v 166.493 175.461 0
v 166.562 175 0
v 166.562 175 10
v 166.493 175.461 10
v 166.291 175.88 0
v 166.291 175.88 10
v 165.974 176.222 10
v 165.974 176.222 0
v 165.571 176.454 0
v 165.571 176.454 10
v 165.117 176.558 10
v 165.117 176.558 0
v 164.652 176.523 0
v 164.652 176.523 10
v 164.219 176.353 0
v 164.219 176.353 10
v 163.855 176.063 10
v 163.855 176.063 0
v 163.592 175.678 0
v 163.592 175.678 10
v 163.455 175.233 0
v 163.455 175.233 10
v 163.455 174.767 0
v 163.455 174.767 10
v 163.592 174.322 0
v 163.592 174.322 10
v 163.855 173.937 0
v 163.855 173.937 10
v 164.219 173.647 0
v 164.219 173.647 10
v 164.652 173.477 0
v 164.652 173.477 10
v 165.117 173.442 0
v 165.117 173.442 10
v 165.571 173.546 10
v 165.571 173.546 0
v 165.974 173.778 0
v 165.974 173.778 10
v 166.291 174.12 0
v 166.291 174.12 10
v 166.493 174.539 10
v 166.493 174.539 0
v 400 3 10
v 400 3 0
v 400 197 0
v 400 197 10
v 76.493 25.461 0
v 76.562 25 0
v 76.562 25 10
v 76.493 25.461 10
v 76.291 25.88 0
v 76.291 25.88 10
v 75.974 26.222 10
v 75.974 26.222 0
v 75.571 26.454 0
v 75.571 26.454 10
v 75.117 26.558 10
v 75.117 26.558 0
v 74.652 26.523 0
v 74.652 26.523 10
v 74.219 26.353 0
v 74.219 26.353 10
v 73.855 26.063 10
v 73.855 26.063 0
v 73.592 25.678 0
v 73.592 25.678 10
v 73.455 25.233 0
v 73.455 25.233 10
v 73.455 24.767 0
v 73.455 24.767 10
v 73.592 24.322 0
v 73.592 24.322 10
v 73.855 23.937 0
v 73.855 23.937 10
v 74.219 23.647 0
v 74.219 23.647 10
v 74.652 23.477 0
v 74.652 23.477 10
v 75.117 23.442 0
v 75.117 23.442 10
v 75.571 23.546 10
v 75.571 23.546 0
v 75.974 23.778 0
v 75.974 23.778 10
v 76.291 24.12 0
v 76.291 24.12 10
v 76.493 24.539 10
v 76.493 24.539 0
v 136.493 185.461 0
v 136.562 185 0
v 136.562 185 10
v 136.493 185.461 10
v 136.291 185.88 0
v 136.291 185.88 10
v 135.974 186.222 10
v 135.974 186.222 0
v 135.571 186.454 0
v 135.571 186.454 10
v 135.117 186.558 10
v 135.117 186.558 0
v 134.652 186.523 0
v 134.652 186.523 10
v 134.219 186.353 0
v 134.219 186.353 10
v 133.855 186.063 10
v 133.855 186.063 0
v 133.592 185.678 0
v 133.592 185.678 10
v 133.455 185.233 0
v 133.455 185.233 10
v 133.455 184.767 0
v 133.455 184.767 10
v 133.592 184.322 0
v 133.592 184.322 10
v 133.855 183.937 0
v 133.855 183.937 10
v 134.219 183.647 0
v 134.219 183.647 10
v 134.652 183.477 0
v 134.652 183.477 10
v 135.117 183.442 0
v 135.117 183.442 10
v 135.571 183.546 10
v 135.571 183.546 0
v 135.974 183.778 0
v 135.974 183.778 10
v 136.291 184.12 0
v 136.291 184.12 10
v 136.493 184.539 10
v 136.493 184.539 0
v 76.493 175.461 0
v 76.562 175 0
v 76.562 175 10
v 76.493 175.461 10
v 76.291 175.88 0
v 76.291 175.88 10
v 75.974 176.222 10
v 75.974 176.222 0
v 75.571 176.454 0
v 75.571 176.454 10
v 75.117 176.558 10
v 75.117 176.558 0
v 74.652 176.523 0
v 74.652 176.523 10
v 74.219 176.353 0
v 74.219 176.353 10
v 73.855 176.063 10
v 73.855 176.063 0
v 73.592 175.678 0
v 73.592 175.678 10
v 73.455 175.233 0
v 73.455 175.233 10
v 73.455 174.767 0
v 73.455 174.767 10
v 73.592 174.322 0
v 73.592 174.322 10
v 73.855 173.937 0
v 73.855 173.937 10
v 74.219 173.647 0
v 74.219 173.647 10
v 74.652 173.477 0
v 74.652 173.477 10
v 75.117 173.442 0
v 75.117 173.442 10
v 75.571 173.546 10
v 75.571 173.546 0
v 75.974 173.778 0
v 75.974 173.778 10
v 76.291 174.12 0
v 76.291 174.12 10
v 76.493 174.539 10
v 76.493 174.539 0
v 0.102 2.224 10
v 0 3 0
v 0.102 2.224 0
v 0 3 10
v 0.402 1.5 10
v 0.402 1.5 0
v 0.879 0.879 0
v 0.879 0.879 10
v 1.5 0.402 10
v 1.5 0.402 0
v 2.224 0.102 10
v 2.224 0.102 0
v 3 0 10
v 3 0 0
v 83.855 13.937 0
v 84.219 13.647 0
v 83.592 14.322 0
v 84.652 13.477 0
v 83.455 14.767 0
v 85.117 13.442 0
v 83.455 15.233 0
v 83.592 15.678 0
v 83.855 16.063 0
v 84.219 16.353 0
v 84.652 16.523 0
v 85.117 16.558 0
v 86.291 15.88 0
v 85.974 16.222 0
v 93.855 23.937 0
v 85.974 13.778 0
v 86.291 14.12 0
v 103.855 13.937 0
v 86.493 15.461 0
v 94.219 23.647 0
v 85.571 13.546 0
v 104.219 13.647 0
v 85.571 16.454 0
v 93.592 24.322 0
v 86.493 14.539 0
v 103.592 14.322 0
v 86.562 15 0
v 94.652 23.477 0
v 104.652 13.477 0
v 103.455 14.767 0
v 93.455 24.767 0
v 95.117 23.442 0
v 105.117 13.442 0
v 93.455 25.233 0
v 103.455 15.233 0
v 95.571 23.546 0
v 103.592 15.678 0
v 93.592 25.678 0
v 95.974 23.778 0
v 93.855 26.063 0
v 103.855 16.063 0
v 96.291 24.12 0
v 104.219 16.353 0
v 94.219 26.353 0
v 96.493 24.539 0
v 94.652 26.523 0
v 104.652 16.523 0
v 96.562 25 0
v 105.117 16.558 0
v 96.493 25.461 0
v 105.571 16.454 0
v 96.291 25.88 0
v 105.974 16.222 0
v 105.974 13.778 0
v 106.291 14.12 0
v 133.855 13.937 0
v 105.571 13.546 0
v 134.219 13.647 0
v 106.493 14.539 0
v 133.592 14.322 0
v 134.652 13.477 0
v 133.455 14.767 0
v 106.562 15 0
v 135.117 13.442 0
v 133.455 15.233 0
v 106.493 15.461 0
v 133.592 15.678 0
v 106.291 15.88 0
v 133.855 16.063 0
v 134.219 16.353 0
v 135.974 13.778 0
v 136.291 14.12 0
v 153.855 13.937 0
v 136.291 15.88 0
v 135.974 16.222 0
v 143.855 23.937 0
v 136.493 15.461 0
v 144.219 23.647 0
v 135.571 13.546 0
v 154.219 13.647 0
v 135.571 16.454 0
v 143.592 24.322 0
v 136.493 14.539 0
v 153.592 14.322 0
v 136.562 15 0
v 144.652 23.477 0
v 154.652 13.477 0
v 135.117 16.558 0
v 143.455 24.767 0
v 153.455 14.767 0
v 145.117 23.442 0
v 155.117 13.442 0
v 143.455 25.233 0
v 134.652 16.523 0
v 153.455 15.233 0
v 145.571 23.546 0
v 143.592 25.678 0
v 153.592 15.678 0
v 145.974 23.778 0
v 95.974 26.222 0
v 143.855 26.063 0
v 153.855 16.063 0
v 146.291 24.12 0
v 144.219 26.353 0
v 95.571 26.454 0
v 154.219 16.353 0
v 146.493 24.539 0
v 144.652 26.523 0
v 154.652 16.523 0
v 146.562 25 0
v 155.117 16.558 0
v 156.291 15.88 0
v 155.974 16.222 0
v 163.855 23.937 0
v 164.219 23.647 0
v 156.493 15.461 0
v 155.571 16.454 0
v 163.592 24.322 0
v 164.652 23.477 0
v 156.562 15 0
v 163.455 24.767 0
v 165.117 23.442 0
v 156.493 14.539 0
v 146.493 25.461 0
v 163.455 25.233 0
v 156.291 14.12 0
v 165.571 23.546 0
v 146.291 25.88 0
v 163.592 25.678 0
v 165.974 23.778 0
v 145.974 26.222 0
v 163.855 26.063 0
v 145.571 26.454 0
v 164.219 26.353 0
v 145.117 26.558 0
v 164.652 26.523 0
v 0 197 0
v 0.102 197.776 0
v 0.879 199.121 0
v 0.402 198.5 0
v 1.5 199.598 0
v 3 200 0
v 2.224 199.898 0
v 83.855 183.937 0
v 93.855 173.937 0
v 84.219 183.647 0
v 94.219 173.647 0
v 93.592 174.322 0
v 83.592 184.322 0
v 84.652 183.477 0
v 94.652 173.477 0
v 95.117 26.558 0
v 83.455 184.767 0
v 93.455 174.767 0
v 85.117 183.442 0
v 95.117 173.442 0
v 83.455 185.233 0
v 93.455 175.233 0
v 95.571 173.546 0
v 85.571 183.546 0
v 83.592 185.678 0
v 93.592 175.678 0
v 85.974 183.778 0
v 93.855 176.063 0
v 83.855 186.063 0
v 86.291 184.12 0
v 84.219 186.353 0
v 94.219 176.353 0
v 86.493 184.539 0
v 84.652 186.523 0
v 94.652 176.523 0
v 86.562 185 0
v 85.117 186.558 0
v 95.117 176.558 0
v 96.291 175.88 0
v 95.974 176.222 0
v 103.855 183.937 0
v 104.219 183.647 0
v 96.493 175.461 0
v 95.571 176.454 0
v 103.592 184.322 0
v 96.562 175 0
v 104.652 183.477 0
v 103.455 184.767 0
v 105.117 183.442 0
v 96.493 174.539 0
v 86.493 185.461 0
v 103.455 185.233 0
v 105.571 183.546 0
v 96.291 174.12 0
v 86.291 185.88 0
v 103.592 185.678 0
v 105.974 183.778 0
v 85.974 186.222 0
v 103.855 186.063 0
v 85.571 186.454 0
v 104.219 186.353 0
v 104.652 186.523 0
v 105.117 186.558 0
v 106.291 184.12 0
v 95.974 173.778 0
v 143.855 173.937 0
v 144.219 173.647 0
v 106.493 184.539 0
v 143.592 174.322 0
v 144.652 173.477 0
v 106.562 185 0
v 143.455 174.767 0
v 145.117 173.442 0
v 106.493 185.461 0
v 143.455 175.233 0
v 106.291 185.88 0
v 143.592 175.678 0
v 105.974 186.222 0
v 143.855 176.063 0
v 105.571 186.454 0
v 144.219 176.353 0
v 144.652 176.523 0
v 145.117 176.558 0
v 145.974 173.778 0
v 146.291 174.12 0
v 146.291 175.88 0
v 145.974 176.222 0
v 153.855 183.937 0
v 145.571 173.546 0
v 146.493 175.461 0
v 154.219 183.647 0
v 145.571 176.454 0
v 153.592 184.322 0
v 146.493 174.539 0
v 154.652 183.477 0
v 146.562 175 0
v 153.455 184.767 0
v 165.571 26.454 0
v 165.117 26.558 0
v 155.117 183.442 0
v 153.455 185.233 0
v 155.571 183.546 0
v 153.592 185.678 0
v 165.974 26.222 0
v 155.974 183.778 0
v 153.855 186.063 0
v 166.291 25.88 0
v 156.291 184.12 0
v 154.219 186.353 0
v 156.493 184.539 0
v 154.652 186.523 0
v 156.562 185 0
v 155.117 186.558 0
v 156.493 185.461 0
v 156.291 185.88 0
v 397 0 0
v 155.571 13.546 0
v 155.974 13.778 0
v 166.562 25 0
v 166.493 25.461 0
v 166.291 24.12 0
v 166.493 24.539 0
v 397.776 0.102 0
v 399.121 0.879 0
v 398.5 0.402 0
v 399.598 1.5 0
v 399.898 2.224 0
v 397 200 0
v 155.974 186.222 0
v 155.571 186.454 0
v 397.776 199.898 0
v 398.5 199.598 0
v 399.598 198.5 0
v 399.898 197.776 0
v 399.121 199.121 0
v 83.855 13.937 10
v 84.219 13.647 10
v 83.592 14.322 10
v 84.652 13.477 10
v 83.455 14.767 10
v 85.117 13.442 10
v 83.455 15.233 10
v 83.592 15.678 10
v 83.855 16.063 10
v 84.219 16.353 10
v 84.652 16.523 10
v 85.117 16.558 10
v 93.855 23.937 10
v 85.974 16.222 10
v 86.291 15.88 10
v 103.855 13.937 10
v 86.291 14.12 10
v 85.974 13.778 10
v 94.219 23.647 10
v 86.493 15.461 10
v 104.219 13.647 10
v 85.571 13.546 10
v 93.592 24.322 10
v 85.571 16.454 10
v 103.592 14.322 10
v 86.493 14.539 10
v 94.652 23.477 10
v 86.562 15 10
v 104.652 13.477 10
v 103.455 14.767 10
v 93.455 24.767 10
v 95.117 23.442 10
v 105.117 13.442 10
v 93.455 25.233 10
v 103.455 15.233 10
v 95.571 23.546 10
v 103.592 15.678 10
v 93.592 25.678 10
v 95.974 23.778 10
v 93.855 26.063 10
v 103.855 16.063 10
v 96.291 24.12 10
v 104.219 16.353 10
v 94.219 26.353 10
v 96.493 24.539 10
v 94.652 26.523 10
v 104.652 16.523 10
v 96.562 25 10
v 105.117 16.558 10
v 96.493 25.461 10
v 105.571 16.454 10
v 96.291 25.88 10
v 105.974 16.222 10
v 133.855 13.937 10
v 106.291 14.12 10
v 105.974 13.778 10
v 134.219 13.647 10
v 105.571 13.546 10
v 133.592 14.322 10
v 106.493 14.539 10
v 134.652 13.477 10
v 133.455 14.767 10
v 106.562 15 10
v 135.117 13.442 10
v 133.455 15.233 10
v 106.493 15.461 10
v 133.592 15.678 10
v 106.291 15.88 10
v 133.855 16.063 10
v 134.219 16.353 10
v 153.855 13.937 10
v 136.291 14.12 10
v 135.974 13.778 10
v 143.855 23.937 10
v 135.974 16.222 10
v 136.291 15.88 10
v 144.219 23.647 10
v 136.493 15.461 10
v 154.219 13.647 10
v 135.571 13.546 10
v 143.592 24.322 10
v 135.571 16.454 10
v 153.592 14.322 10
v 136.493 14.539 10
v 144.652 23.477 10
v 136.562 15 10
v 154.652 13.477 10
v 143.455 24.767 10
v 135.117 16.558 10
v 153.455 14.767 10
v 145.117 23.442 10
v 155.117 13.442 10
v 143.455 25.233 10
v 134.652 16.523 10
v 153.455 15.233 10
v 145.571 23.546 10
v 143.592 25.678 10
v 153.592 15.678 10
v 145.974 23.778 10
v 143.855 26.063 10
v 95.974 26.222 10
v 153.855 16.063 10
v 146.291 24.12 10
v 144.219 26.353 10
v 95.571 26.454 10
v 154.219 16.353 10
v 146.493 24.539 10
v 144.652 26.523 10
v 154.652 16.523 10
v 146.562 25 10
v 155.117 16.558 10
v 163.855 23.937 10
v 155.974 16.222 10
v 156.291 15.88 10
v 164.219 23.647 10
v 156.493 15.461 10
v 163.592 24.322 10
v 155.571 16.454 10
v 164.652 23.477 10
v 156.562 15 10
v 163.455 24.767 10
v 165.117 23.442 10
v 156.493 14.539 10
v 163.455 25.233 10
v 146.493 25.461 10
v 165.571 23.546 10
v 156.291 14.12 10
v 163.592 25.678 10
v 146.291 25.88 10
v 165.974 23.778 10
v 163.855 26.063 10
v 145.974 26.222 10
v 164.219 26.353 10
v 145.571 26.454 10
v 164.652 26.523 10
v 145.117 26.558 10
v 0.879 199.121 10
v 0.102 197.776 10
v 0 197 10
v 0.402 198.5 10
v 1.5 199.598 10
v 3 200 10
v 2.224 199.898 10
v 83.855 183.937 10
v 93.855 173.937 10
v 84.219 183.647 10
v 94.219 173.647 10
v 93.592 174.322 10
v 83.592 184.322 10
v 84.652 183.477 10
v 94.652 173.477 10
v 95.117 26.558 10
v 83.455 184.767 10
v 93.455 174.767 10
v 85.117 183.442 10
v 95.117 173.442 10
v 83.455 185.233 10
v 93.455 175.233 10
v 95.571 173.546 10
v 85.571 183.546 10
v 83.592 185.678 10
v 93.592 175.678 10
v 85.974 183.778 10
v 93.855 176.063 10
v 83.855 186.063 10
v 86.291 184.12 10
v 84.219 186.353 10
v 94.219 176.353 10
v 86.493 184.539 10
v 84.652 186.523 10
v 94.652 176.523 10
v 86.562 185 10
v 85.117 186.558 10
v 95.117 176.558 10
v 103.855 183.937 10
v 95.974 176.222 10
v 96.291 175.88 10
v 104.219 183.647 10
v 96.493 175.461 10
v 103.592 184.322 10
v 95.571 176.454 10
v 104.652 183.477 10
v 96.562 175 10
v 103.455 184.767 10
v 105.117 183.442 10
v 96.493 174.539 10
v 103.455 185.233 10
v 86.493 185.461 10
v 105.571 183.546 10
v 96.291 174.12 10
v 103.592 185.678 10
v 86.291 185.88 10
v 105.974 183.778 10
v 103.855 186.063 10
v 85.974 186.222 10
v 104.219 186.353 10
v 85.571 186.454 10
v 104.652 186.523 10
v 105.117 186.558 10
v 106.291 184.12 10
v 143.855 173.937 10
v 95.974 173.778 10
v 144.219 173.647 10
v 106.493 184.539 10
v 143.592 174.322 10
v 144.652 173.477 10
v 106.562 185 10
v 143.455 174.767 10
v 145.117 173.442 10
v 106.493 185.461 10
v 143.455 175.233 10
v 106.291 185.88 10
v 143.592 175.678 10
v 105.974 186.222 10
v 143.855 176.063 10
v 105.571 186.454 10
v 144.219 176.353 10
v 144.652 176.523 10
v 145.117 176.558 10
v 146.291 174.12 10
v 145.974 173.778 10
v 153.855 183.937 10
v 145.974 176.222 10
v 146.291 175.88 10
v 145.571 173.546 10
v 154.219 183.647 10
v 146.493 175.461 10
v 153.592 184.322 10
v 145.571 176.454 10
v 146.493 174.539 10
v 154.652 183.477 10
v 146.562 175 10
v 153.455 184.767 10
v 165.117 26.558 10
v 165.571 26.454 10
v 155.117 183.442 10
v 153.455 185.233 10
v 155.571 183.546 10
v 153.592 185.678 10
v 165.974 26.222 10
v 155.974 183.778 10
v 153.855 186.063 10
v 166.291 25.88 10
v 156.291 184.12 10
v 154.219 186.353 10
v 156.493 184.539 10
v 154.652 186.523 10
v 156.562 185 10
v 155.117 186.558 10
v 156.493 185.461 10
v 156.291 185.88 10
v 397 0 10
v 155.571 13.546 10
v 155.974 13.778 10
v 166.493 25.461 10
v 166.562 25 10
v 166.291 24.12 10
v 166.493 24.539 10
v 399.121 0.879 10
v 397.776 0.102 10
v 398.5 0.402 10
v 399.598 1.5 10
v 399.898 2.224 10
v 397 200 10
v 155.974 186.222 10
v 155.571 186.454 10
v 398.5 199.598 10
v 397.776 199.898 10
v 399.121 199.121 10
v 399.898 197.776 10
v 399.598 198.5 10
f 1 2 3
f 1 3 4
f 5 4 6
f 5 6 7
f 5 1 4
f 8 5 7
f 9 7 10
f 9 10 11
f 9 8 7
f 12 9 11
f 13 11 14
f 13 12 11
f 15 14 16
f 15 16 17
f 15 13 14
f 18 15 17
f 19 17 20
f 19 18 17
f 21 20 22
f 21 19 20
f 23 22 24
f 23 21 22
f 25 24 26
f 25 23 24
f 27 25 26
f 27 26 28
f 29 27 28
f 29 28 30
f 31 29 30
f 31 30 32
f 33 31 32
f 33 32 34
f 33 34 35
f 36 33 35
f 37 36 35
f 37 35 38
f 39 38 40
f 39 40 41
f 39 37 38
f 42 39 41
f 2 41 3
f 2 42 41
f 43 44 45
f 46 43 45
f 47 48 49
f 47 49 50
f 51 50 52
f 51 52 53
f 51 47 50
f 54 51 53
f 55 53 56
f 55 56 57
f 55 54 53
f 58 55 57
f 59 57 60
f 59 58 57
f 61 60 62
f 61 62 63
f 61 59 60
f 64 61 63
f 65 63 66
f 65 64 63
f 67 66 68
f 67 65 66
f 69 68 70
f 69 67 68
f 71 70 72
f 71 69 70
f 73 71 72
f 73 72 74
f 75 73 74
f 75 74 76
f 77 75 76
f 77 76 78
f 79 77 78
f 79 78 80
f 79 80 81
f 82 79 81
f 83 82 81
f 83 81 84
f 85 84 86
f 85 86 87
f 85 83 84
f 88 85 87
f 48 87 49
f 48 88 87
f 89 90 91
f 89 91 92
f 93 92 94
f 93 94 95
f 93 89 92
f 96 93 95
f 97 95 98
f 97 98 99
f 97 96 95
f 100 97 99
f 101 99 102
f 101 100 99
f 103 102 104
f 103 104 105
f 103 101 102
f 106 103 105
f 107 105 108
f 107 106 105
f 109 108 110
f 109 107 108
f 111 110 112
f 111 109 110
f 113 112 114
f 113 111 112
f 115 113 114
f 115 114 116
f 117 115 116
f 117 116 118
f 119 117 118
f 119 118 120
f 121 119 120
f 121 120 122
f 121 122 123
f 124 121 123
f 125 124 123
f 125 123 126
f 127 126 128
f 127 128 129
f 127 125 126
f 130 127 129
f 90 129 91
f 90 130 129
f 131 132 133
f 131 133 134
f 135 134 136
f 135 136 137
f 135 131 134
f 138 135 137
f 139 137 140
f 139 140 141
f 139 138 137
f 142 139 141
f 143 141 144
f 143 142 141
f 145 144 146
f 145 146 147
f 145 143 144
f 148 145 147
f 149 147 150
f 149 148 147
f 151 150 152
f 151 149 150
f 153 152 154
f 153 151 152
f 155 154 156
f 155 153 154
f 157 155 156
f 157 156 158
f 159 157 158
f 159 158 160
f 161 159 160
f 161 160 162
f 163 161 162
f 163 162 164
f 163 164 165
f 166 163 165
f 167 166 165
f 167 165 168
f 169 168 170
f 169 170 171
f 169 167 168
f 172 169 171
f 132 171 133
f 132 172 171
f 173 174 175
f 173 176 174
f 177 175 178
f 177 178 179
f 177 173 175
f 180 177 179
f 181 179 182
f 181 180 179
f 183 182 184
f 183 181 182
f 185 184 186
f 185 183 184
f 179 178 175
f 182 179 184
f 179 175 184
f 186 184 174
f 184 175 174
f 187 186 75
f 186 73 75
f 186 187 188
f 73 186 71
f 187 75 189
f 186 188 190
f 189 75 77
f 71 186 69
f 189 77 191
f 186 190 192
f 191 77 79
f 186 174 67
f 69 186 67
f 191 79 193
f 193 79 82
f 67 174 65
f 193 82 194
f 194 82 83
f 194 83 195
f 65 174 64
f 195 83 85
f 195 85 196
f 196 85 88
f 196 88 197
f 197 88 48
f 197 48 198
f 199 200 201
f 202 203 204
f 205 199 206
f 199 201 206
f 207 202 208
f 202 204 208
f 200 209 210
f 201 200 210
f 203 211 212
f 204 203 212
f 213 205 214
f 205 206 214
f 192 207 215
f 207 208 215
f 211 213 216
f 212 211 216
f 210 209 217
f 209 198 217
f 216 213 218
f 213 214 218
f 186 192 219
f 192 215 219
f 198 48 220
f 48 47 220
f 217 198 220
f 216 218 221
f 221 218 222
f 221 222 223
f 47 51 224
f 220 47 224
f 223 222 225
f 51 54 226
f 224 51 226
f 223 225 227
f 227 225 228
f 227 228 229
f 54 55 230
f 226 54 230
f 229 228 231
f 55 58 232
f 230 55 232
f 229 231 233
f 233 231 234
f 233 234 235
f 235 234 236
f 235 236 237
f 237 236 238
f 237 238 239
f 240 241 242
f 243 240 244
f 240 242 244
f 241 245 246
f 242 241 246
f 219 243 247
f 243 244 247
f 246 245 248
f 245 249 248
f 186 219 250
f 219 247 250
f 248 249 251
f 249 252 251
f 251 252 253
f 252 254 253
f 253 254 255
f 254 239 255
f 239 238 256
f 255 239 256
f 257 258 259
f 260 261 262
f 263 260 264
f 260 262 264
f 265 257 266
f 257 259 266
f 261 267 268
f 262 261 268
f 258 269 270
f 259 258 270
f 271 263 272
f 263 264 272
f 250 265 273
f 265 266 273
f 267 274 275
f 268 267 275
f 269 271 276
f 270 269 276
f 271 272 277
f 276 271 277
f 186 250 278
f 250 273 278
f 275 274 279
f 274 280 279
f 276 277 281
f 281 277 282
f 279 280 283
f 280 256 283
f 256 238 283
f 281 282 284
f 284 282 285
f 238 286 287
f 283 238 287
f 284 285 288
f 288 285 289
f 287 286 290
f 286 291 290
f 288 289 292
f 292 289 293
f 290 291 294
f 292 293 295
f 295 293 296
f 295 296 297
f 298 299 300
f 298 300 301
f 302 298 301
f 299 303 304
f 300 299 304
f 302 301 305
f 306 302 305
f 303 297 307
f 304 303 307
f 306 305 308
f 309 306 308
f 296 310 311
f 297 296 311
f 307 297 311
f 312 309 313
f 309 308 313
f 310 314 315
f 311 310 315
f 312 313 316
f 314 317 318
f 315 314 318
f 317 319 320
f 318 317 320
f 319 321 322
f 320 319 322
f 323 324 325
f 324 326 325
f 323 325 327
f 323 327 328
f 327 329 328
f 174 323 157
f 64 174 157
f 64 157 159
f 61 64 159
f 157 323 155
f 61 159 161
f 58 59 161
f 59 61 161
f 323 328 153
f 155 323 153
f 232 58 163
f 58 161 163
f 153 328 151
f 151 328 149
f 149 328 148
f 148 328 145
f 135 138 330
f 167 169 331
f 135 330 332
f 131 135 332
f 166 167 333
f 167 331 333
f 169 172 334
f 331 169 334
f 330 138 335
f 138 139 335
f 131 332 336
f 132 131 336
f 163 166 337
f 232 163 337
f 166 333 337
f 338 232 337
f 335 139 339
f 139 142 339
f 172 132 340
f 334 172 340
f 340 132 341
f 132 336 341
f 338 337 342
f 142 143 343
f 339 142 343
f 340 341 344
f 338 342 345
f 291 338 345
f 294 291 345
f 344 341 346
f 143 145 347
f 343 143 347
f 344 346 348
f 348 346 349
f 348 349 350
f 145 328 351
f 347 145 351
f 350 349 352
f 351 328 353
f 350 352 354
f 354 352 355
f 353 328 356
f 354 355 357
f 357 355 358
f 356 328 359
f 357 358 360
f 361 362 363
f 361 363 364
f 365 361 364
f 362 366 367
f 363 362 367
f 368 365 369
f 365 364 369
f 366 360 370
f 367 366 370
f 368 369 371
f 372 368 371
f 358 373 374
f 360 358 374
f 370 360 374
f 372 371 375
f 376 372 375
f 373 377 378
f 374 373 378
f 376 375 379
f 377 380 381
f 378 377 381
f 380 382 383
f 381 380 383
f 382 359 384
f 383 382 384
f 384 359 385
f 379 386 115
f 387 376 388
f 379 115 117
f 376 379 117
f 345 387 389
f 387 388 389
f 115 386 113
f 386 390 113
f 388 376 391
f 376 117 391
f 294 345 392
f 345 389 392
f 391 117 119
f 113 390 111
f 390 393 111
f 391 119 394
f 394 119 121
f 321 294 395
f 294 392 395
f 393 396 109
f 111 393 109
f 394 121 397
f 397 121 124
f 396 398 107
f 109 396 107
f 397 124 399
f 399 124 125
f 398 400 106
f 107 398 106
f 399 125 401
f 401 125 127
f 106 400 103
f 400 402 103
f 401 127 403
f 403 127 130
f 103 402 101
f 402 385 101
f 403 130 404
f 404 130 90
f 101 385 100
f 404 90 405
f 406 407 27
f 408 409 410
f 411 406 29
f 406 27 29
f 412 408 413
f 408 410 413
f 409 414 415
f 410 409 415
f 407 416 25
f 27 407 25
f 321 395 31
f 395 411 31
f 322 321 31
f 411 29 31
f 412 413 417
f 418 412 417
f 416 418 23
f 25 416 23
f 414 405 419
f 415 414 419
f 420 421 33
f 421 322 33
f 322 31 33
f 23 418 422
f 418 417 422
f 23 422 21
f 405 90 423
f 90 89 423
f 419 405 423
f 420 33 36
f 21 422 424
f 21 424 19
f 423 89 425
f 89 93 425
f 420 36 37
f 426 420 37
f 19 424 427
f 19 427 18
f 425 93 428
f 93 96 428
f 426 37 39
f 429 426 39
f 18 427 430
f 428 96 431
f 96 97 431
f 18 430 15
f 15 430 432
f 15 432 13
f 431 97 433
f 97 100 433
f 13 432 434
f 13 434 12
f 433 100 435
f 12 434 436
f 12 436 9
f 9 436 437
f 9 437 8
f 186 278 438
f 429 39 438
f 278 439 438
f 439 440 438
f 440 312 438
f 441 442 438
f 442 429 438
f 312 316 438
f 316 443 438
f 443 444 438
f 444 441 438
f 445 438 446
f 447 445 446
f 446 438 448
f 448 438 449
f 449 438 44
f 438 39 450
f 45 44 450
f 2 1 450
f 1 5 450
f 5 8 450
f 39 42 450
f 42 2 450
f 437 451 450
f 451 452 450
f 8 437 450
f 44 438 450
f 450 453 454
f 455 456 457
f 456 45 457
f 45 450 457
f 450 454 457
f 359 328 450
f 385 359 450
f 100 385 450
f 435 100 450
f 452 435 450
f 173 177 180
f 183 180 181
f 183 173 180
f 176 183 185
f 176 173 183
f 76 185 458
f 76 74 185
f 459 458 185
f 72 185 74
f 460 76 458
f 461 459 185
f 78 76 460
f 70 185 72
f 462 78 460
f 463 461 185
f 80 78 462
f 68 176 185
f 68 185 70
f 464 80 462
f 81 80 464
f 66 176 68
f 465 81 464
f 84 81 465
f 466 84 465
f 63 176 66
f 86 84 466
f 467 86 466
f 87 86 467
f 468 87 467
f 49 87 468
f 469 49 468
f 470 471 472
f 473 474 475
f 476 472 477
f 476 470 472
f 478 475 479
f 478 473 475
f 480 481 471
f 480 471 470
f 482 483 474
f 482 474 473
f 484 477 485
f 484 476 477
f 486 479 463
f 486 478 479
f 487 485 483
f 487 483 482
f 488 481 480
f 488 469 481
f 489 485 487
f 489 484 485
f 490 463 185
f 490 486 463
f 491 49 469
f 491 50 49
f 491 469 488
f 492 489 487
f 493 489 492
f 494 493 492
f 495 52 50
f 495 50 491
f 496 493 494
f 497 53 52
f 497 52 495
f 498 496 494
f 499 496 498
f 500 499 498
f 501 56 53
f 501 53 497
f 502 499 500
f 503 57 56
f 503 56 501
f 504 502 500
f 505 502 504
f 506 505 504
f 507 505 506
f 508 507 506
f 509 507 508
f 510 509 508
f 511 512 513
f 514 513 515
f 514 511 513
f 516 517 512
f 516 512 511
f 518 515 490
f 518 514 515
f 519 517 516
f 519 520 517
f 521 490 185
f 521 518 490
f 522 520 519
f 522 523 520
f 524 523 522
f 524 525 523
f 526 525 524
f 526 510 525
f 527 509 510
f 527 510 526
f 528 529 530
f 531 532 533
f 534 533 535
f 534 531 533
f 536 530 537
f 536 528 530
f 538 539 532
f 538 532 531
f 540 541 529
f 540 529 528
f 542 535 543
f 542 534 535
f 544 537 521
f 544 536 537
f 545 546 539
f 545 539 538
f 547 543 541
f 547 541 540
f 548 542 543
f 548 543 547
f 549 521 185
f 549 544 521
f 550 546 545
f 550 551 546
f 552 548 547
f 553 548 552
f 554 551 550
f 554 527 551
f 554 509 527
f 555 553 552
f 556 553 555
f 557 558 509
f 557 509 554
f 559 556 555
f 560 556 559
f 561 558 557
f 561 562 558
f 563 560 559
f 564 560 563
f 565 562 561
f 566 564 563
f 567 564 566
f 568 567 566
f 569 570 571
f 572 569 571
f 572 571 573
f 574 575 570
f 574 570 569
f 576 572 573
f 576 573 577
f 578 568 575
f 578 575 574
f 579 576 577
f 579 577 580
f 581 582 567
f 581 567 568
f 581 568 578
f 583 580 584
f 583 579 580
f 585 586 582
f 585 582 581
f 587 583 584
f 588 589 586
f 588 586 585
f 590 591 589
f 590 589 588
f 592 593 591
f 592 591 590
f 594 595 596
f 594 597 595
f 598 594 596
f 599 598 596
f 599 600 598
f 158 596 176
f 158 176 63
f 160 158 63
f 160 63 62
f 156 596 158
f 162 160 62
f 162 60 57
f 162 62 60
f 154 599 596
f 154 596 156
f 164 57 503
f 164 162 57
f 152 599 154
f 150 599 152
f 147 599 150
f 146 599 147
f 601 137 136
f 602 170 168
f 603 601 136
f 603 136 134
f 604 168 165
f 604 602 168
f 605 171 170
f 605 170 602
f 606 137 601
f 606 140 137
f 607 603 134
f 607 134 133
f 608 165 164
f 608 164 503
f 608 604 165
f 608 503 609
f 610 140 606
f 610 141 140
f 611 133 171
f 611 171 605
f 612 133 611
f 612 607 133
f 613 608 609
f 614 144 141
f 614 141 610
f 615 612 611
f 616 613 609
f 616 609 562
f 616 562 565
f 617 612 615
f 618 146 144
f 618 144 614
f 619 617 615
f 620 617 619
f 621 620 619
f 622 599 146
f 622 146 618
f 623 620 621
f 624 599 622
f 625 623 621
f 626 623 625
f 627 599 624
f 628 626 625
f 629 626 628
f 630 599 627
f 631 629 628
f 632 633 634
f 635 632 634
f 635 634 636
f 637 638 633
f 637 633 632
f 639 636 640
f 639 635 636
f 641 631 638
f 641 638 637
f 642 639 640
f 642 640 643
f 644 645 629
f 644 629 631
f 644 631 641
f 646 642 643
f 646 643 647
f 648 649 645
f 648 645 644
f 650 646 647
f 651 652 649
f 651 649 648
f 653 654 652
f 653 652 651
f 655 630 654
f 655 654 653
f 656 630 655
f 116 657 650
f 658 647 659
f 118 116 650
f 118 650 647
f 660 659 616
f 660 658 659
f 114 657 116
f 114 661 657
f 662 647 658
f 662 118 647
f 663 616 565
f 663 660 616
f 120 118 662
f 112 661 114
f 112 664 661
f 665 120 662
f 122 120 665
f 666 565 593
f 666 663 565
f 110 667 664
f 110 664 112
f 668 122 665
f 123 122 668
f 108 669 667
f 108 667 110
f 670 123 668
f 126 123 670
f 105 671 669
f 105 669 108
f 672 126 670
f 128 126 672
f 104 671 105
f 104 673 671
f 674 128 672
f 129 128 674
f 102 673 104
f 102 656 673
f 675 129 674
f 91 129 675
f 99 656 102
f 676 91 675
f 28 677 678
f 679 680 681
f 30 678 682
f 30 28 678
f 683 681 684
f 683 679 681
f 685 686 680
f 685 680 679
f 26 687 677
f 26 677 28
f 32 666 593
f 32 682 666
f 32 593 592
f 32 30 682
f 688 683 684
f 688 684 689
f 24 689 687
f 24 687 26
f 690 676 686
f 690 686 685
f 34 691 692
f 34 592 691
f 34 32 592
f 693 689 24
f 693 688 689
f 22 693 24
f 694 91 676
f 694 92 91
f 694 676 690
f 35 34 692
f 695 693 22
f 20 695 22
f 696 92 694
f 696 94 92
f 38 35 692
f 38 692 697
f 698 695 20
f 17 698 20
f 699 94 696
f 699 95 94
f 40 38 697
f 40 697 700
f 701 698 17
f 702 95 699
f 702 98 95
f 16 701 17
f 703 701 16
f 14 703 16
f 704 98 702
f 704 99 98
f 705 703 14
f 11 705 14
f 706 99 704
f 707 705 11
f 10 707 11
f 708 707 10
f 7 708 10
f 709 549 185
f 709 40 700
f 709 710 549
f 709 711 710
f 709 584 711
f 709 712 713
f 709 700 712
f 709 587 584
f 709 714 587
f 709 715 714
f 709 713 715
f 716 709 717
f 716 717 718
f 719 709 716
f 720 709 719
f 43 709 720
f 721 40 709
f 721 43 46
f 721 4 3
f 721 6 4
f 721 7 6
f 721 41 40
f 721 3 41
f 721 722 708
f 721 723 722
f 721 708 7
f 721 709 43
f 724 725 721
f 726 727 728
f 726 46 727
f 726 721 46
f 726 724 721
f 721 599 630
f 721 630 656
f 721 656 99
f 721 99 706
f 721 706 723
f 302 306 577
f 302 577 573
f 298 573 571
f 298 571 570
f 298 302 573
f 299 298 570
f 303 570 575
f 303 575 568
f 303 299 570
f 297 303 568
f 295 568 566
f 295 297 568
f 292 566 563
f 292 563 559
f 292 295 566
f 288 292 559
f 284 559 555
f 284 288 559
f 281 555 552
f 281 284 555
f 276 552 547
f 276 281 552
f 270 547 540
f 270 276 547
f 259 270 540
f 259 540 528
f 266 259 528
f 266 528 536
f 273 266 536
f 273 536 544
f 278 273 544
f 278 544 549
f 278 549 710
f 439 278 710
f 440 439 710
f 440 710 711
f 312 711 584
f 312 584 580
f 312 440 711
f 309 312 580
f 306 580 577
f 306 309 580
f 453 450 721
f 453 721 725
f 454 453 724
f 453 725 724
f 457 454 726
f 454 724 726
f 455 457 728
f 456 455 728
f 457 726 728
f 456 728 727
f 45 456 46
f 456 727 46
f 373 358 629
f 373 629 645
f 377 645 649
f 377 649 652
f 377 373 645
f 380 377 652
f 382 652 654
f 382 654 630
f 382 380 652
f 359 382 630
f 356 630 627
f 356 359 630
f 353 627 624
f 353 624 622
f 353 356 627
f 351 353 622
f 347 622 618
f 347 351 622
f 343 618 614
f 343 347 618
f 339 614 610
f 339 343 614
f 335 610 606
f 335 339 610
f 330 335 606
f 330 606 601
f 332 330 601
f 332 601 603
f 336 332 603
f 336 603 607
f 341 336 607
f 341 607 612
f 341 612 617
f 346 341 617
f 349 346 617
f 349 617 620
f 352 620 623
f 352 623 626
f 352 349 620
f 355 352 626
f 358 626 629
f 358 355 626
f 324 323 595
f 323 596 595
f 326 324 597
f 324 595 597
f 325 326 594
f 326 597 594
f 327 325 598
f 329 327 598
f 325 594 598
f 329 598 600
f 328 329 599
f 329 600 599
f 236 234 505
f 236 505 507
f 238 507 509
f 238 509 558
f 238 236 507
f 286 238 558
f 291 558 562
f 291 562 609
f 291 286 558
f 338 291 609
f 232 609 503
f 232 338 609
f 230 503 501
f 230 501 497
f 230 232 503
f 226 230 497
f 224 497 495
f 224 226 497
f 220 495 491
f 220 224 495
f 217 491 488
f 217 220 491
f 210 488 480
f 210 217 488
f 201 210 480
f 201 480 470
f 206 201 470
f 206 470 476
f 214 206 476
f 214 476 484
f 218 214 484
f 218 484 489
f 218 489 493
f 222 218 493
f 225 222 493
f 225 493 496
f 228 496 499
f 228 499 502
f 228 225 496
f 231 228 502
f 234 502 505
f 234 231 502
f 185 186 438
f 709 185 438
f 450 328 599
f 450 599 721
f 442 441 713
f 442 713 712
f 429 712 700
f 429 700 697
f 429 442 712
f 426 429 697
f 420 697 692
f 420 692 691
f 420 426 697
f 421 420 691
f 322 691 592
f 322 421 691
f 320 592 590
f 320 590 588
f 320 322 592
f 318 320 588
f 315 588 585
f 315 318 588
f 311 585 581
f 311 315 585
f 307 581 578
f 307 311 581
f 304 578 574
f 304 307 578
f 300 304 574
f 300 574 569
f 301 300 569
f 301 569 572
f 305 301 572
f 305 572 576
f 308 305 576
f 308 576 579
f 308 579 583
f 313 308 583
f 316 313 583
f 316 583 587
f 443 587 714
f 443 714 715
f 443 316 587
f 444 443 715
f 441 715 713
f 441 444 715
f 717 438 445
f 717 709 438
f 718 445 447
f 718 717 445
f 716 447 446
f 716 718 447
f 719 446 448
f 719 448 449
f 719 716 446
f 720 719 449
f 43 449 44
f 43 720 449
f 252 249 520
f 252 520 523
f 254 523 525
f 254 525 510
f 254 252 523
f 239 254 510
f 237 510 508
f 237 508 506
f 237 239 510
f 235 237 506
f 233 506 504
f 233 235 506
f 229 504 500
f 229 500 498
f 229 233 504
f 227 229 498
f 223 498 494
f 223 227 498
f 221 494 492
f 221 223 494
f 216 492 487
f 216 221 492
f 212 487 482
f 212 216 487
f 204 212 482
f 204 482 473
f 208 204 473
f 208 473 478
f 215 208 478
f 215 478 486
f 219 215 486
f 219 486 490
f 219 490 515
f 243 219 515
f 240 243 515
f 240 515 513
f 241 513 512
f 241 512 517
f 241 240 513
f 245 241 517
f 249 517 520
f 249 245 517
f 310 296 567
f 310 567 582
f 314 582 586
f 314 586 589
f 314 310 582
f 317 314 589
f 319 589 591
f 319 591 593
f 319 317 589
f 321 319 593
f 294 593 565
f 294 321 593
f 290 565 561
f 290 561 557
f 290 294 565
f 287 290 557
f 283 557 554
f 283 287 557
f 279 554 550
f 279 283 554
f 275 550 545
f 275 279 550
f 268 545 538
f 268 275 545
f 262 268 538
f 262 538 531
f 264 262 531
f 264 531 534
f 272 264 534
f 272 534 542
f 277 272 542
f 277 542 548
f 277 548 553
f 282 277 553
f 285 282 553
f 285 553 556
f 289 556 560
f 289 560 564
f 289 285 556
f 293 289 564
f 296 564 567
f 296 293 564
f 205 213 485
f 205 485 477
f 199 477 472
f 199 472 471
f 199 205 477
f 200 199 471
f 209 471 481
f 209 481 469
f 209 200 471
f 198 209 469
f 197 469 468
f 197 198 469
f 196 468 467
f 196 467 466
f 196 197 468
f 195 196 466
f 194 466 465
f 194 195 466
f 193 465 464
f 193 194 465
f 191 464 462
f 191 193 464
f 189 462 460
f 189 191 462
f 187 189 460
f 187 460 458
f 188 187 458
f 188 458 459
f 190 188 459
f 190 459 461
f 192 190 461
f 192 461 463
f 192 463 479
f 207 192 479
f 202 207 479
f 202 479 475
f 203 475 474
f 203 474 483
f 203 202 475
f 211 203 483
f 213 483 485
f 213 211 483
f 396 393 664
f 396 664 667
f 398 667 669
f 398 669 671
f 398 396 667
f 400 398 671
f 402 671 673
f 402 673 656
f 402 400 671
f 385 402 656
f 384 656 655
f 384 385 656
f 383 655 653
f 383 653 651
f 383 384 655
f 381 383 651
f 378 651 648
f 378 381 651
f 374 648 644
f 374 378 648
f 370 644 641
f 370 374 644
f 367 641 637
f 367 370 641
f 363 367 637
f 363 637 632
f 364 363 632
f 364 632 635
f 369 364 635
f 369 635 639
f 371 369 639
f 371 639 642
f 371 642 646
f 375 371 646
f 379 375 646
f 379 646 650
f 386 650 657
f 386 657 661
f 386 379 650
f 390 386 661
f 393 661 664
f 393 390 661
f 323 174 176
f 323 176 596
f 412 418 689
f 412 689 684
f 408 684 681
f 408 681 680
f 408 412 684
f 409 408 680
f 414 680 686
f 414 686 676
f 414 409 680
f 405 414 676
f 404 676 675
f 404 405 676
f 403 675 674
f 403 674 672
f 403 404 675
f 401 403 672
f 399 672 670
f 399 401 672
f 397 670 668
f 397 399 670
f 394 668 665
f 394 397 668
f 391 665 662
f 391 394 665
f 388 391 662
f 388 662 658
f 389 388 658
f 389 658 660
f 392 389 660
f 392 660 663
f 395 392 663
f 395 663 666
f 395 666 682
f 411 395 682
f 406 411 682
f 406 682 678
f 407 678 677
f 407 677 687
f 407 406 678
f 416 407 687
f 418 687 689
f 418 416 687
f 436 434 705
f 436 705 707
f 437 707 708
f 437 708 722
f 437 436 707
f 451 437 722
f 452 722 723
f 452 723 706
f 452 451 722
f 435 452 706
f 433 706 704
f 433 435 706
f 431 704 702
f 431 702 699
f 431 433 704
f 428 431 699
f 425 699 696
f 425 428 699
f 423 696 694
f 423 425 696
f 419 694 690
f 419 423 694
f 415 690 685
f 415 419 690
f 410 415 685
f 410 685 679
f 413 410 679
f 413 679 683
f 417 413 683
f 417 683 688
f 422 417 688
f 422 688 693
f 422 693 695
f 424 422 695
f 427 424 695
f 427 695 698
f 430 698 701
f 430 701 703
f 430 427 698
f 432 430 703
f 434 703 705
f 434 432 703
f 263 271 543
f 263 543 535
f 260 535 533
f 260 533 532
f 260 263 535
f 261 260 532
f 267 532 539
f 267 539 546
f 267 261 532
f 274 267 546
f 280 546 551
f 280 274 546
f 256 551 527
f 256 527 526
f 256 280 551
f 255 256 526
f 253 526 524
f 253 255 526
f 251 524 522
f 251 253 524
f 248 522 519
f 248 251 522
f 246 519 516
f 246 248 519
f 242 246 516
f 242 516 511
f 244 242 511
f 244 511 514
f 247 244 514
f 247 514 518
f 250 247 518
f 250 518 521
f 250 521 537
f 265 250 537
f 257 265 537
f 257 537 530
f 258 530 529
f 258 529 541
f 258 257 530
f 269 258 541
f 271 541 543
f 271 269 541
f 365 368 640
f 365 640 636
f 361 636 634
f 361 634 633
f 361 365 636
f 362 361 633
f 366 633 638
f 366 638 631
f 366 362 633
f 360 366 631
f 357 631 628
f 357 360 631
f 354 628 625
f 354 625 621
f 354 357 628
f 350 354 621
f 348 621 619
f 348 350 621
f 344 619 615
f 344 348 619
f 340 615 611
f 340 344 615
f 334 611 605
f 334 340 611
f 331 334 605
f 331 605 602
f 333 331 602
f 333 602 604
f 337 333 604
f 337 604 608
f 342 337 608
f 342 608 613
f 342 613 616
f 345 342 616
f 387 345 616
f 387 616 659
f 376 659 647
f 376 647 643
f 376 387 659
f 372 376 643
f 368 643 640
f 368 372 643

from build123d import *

# Parameters (mm, degrees)
SKETCH_W  = 400
SKETCH_H  = 200
SKETCH_R  = 1.5625
PAD_DEPTH = 10
FILLET_R  = 3


with BuildPart() as part:
    # Sketch → Pad (new body)
    with BuildSketch(Plane.XY):
        with Locations((200, 100)):
            Rectangle(SKETCH_W, SKETCH_H)
        with Locations((85, 15)):
            Circle(SKETCH_R, mode=Mode.SUBTRACT)
        with Locations((105, 15)):
            Circle(SKETCH_R, mode=Mode.SUBTRACT)
        with Locations((75, 25)):
            Circle(SKETCH_R, mode=Mode.SUBTRACT)
        with Locations((95, 25)):
            Circle(SKETCH_R, mode=Mode.SUBTRACT)
        with Locations((155, 15)):
            Circle(SKETCH_R, mode=Mode.SUBTRACT)
        with Locations((135, 15)):
            Circle(SKETCH_R, mode=Mode.SUBTRACT)
        with Locations((145, 25)):
            Circle(SKETCH_R, mode=Mode.SUBTRACT)
        with Locations((165, 25)):
            Circle(SKETCH_R, mode=Mode.SUBTRACT)
        with Locations((85, 185)):
            Circle(SKETCH_R, mode=Mode.SUBTRACT)
        with Locations((105, 185)):
            Circle(SKETCH_R, mode=Mode.SUBTRACT)
        with Locations((75, 175)):
            Circle(SKETCH_R, mode=Mode.SUBTRACT)
        with Locations((95, 175)):
            Circle(SKETCH_R, mode=Mode.SUBTRACT)
        with Locations((155, 185)):
            Circle(SKETCH_R, mode=Mode.SUBTRACT)
        with Locations((135, 185)):
            Circle(SKETCH_R, mode=Mode.SUBTRACT)
        with Locations((145, 175)):
            Circle(SKETCH_R, mode=Mode.SUBTRACT)
        with Locations((165, 175)):
            Circle(SKETCH_R, mode=Mode.SUBTRACT)
    extrude(amount=PAD_DEPTH)

    # Fillet
    fillet_edges = [part.edges().sort_by_distance(p)[0] for p in [
        (0, 0, 5),
        (400, 0, 5),
        (400, 200, 5),
        (0, 200, 5),
    ]]
    fillet(fillet_edges, radius=FILLET_R)


solid = part.part
